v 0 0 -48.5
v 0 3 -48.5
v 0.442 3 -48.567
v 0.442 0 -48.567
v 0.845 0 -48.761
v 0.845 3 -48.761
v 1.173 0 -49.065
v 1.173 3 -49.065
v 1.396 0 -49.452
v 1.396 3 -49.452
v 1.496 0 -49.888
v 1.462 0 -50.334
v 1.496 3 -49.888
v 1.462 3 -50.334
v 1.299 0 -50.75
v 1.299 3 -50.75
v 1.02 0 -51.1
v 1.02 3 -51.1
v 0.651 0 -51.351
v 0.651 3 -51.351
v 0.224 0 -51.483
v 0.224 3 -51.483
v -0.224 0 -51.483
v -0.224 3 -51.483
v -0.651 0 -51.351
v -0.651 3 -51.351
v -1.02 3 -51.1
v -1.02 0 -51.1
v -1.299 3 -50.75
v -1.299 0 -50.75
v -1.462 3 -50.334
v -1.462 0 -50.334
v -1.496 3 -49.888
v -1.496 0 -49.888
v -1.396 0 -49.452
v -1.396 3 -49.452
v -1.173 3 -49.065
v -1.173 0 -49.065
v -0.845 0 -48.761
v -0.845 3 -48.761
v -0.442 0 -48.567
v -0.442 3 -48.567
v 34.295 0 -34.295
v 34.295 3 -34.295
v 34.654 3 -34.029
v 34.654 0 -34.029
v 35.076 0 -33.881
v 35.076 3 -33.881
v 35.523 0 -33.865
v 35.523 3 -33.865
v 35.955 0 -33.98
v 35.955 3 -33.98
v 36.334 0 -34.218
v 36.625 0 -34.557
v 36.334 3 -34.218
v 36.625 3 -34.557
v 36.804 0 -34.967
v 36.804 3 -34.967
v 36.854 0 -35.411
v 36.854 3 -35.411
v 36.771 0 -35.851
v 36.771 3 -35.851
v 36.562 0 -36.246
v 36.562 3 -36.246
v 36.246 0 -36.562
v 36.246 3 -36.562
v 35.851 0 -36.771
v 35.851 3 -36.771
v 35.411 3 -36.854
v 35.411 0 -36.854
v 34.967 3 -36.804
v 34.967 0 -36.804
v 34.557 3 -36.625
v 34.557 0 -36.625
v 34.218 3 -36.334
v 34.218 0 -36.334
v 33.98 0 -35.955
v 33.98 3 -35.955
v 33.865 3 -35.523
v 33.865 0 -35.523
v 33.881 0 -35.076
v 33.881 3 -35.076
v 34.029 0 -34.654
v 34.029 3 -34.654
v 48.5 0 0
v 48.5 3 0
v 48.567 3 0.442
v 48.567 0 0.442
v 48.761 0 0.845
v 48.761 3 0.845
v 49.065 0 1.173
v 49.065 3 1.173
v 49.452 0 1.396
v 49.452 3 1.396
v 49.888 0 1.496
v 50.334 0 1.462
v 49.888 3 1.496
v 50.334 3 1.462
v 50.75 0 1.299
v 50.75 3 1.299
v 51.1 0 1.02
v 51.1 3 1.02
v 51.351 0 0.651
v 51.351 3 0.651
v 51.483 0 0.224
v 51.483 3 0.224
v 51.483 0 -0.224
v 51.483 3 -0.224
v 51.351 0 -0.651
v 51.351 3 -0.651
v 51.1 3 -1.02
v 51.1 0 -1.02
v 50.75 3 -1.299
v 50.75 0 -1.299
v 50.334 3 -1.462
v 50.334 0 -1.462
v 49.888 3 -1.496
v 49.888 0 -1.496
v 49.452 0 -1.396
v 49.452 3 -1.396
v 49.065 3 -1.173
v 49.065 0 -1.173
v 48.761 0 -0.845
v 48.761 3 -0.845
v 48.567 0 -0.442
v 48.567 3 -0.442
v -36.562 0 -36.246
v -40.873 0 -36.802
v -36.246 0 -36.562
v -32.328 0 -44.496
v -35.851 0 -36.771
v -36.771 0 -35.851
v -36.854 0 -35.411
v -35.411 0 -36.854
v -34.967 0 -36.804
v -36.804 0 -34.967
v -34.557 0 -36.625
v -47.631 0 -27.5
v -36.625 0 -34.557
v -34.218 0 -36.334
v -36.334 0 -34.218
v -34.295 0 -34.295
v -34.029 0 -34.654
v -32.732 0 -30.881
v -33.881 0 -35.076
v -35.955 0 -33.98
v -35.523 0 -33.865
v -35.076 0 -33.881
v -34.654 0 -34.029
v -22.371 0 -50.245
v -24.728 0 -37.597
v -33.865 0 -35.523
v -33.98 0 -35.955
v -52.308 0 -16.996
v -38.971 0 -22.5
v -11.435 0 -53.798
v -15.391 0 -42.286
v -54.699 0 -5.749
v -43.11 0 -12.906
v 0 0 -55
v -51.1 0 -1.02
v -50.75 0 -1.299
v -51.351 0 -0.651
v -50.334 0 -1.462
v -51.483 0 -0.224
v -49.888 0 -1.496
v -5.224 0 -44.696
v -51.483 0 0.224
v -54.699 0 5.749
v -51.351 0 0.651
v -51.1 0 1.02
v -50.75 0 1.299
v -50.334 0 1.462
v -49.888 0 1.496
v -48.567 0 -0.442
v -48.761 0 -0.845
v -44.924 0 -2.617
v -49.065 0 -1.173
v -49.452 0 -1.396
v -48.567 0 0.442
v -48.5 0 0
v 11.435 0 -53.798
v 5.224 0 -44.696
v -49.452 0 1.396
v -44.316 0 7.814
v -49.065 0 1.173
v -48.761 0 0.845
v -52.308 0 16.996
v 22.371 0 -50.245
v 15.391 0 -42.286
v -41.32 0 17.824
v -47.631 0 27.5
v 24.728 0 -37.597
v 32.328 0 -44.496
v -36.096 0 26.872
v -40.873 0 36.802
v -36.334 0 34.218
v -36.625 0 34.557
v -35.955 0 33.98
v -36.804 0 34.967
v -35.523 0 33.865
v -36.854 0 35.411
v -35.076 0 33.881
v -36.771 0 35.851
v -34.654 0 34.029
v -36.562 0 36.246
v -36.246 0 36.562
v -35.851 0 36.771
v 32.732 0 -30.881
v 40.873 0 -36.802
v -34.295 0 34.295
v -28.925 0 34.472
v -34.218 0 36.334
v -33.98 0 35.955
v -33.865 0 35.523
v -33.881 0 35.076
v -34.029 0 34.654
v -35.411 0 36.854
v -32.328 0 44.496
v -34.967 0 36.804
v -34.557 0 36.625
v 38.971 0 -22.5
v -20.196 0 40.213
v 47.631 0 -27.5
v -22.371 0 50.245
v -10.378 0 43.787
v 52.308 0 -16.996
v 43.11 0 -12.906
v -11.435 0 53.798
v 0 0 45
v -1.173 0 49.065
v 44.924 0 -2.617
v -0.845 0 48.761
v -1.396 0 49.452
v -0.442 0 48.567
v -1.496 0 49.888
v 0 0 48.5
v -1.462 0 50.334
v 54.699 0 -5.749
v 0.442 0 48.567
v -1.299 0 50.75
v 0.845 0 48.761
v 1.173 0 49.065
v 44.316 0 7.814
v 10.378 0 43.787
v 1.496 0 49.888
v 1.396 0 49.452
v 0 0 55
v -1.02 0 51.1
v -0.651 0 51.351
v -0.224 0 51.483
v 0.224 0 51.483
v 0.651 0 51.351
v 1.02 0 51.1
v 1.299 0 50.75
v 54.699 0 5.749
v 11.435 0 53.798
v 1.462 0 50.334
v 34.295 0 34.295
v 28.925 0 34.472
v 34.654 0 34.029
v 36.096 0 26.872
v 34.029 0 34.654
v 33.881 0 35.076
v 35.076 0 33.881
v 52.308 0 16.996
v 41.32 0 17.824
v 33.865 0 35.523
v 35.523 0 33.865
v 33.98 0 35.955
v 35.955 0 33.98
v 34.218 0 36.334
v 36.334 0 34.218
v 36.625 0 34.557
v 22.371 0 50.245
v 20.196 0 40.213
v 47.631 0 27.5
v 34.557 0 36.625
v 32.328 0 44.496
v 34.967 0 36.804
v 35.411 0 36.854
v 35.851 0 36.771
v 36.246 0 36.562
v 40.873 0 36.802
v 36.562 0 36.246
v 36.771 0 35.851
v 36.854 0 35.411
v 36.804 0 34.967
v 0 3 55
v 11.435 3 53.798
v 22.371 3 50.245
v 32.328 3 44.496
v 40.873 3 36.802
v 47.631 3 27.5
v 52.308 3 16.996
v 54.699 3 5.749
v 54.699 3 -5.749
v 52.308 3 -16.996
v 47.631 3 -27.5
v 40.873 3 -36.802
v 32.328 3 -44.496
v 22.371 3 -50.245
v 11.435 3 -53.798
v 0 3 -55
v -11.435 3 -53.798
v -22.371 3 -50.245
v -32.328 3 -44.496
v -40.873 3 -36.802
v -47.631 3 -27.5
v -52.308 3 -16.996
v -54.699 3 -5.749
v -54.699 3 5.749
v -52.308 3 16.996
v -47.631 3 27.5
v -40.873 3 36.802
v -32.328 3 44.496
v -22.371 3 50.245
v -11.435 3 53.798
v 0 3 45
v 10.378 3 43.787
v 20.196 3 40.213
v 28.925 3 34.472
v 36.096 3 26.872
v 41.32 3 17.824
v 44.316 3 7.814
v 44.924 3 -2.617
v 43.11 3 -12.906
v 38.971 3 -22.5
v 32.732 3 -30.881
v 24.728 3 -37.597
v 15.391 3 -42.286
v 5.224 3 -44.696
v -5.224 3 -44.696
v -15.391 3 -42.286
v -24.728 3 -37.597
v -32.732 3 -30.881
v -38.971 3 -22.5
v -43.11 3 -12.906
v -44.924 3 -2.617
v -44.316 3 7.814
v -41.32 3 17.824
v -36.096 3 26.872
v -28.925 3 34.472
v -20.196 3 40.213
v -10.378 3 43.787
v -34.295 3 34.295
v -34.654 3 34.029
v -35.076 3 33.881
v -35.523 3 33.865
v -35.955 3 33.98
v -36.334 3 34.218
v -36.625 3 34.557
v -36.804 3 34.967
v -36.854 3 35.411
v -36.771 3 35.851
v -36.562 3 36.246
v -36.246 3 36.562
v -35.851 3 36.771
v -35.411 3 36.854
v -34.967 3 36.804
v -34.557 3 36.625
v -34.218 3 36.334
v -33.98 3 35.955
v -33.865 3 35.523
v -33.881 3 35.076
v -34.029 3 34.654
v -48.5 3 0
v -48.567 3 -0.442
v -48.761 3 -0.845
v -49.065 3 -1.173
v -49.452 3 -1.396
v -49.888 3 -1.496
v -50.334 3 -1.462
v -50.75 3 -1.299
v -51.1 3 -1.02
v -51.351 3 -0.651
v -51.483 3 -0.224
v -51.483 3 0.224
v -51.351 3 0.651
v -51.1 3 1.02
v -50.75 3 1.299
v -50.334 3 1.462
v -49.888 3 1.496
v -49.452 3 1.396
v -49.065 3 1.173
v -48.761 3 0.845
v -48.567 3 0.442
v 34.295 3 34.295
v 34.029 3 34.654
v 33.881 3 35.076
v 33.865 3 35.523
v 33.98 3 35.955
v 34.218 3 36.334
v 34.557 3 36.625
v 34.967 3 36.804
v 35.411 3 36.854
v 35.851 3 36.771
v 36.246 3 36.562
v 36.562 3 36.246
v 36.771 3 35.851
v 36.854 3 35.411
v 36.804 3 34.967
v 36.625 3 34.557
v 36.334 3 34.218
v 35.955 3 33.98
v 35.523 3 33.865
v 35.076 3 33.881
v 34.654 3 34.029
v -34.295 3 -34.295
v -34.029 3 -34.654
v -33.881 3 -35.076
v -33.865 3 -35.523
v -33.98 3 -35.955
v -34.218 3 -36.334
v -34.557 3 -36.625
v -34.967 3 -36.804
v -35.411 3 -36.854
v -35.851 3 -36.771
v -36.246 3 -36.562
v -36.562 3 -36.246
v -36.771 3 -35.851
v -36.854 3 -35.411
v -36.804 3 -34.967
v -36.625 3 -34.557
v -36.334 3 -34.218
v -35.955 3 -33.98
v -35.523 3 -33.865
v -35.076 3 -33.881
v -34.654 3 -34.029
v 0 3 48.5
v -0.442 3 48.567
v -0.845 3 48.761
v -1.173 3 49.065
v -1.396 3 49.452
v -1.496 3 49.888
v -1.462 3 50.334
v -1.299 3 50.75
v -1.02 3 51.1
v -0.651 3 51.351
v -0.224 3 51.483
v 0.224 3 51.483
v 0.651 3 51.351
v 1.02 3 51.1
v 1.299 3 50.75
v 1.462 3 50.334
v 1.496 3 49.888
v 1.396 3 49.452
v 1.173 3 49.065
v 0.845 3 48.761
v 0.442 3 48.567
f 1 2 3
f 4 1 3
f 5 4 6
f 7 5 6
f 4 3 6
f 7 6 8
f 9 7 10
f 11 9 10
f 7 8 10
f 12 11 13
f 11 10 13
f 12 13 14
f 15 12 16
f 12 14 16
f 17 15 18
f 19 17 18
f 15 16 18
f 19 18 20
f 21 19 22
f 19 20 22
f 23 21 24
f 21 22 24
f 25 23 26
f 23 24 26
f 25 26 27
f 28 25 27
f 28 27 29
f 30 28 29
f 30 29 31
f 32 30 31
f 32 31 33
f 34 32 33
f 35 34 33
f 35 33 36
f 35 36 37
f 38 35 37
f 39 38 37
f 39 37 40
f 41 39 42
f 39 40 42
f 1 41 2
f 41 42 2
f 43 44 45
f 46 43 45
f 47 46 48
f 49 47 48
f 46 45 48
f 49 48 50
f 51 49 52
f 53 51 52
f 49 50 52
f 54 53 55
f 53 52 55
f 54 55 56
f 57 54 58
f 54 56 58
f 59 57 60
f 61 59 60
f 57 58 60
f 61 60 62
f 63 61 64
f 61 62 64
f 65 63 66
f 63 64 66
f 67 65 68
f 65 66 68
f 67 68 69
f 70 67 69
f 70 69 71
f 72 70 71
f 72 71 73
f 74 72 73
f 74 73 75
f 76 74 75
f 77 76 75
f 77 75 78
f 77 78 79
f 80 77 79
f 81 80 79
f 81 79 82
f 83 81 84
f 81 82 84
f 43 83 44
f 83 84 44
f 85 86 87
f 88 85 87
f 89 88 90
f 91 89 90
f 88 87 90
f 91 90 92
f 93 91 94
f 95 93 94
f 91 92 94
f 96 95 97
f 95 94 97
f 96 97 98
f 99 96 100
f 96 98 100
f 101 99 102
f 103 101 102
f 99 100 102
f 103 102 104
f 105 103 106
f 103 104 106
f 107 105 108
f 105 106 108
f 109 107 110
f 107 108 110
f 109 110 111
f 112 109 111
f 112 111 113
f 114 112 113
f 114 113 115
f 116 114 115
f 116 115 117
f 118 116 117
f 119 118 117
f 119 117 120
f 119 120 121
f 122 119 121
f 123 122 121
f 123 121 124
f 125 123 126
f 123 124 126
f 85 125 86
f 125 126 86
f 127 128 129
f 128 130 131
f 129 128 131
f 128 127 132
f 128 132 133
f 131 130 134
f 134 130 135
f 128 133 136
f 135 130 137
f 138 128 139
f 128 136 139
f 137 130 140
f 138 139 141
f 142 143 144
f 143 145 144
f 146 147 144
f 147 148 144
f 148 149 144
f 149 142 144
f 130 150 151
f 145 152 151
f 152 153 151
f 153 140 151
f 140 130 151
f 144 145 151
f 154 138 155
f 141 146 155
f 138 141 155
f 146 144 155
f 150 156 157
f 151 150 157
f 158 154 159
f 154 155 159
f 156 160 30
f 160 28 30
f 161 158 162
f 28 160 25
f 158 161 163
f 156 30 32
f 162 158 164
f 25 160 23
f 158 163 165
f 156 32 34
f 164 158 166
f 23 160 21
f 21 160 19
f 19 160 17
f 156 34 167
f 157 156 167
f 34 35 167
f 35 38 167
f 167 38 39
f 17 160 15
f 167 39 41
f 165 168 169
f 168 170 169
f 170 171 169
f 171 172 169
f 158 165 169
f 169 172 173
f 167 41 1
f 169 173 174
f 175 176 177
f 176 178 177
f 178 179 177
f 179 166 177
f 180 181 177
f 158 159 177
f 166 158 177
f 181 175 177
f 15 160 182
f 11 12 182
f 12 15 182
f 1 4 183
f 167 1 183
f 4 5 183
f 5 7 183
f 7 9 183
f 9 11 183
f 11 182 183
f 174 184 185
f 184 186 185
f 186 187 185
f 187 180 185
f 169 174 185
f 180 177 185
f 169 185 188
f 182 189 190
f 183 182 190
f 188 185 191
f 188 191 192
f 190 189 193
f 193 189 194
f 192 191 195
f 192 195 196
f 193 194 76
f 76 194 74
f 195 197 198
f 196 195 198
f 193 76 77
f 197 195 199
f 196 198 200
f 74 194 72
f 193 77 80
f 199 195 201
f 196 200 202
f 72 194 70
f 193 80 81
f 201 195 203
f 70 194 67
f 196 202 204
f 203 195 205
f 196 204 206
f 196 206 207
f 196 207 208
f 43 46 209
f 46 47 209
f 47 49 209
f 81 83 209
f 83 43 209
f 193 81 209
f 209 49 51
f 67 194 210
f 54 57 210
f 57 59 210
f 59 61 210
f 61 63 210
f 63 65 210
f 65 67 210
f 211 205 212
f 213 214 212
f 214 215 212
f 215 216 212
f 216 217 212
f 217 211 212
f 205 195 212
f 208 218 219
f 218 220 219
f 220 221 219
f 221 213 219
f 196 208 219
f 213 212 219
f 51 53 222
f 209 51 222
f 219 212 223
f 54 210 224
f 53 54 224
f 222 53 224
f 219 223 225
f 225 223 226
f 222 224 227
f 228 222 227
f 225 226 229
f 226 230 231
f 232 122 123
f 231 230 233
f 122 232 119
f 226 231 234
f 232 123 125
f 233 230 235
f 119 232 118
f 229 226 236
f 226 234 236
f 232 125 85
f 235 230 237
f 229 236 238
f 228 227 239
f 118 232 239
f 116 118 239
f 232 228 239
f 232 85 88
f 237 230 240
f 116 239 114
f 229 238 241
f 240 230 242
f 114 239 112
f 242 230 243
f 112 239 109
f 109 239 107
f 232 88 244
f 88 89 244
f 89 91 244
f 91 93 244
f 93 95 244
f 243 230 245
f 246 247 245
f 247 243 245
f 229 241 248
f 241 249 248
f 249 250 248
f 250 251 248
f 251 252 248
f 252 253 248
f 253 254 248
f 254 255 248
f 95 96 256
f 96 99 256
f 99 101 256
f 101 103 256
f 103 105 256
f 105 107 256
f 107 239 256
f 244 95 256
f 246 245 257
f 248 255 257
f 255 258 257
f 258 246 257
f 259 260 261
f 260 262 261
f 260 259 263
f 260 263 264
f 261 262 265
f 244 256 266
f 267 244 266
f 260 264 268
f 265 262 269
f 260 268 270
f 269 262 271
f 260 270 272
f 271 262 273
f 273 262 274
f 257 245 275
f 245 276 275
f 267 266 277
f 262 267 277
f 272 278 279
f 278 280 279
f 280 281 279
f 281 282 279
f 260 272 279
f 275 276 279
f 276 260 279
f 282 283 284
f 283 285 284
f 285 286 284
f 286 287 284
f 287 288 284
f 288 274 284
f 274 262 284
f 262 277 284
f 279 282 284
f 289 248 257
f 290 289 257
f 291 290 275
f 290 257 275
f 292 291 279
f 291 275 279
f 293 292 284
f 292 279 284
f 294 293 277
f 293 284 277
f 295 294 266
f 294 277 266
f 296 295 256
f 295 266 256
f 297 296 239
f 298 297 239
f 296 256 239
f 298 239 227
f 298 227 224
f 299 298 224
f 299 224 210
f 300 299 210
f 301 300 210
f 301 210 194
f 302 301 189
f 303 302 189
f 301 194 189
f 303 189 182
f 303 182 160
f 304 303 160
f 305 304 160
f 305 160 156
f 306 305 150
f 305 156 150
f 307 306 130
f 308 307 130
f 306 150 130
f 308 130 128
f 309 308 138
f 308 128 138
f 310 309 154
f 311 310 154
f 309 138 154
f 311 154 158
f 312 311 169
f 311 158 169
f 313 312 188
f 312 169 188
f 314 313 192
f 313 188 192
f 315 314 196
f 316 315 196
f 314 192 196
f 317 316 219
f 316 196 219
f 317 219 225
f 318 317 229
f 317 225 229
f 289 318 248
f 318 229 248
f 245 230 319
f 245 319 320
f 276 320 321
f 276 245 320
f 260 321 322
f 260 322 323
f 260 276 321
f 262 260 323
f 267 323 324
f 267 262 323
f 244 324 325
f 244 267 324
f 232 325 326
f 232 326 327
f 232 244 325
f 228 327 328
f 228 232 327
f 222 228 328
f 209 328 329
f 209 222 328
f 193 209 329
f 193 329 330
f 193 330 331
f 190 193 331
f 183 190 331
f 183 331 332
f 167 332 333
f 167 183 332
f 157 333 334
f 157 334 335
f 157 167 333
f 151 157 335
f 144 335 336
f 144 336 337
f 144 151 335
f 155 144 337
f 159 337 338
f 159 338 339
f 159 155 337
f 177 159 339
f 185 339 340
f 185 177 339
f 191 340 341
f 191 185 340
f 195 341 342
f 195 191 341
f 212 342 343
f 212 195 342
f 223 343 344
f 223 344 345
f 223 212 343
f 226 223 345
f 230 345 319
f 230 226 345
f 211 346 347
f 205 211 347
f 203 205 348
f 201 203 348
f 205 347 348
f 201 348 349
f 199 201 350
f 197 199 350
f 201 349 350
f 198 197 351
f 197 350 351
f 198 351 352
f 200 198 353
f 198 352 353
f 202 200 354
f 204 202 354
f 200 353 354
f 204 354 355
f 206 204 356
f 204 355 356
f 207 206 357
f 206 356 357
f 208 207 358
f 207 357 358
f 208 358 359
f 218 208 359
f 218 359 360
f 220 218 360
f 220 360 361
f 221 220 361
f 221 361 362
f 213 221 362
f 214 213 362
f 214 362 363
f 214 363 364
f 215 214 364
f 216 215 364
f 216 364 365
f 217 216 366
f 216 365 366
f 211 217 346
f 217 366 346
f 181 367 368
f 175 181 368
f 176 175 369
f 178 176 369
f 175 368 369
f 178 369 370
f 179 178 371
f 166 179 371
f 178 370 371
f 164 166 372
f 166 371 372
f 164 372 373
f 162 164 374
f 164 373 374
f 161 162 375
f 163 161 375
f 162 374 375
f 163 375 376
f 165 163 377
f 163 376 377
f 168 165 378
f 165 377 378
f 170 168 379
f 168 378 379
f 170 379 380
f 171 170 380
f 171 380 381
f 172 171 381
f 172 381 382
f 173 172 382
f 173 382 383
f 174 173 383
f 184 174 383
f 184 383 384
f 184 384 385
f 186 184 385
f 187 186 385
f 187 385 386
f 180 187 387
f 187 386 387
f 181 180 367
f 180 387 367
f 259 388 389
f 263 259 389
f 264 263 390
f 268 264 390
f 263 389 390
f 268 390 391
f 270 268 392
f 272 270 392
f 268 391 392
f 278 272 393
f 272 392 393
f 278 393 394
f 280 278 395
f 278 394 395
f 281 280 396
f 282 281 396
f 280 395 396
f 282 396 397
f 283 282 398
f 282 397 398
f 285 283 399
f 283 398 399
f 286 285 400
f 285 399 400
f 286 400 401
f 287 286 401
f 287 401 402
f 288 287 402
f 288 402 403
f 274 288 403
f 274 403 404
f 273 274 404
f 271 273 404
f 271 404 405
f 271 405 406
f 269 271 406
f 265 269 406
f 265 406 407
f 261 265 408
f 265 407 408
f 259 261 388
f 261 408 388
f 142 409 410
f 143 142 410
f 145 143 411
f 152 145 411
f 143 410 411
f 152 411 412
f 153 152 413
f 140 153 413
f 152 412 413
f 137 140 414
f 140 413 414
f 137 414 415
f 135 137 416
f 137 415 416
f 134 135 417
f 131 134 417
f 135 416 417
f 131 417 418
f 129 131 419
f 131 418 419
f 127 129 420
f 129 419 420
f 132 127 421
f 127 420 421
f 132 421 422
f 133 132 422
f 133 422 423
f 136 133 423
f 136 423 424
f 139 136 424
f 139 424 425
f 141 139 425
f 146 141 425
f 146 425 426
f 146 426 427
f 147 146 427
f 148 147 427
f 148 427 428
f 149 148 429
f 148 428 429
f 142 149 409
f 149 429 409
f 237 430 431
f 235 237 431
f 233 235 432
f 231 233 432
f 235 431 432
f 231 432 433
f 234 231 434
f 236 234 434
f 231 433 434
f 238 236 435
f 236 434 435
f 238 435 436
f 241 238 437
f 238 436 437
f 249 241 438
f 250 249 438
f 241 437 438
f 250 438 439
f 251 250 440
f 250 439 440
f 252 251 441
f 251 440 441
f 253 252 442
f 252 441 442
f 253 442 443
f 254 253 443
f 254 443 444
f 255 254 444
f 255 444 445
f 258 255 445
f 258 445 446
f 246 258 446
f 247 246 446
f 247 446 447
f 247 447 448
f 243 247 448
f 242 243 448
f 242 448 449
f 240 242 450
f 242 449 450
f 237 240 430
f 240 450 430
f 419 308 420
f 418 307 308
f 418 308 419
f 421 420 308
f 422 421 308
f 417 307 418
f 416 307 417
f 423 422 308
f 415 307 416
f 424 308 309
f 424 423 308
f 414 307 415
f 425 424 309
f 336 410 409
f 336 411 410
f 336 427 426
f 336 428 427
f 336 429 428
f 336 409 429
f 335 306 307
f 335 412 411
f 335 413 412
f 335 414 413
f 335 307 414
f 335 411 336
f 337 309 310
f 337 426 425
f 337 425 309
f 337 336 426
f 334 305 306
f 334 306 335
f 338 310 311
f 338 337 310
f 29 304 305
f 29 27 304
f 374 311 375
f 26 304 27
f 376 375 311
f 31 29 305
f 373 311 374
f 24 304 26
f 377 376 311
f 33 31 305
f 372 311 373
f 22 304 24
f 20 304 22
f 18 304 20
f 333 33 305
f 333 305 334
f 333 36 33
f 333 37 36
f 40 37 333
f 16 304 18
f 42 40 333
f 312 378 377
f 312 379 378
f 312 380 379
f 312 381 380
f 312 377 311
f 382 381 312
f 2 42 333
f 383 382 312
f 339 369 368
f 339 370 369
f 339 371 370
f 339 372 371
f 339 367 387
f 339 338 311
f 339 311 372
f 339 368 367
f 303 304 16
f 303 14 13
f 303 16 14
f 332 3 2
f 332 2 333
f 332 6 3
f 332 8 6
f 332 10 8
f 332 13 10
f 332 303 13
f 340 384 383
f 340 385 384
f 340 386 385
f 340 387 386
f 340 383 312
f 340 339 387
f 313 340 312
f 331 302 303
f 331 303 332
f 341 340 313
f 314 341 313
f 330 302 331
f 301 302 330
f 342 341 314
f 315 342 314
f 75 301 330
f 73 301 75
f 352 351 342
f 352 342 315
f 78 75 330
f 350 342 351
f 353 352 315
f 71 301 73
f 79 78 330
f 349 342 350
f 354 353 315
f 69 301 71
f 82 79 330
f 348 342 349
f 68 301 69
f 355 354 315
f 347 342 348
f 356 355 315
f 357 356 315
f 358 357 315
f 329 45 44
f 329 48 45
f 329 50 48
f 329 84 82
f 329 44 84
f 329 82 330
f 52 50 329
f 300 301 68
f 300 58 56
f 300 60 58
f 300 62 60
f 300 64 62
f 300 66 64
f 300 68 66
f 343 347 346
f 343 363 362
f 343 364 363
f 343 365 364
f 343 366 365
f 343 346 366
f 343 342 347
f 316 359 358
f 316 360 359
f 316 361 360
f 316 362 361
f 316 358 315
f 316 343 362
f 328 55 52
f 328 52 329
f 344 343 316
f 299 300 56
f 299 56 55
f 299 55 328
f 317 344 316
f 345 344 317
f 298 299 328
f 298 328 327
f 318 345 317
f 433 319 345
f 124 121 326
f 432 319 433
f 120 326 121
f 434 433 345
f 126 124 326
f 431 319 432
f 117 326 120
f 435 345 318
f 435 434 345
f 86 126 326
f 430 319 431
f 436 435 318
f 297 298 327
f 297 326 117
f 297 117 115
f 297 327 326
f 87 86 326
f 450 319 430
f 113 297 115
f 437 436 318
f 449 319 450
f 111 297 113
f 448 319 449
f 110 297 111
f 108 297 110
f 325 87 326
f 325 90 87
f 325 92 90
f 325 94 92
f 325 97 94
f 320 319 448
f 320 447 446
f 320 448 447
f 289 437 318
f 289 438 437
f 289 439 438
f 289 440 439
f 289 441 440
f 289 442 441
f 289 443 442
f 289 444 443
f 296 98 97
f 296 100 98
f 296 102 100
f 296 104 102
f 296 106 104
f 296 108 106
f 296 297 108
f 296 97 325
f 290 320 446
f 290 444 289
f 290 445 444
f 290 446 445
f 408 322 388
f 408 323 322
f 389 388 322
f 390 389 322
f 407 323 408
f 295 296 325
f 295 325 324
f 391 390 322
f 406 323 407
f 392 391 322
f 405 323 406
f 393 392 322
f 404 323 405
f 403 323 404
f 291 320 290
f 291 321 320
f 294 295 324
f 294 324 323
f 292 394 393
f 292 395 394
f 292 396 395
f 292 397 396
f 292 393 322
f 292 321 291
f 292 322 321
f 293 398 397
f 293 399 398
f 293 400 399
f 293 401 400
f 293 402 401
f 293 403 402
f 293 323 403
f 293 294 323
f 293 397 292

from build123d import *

# Parameters (mm, degrees)
SKETCH1_R           = 55
SKETCH1_R_2         = 45
BOSS_EXTRUDE1_DEPTH = 3
SKETCH3_R           = 1.5
CUT_EXTRUDE1_DEPTH  = 3
CRVPATTERN1_COUNT   = 8


with BuildPart() as part:
    # Sketch1 → Boss-Extrude1 (new body)
    with BuildSketch(Plane(origin=(0, 0, 0), x_dir=(1, 0, 0), z_dir=(0, 1, 0))):
        with Locations(Location((0, 0, 0), (0, 0, 270))):
            Circle(SKETCH1_R)
        with Locations(Location((0, 0, 0), (0, 0, 270))):
            Circle(SKETCH1_R_2, mode=Mode.SUBTRACT)
    extrude(amount=BOSS_EXTRUDE1_DEPTH)

    # Sketch3 → Cut-Extrude1 (cut)
    with BuildSketch(Plane(origin=(0, 3, 0), x_dir=(1, 0, 0), z_dir=(0, 1, 0))):
        with Locations(Location((0, 50, 0), (0, 0, 270))):
            Circle(SKETCH3_R)
    cut_extrude1 = extrude(amount=-CUT_EXTRUDE1_DEPTH, mode=Mode.SUBTRACT)

    # CrvPattern1: Cut-Extrude1 ×8 about axis
    crvpattern1_axis = Axis((0, 3, 0), (0, 1, 0))
    for i in range(1, CRVPATTERN1_COUNT):
        add(cut_extrude1.rotate(crvpattern1_axis, i * 360 / CRVPATTERN1_COUNT), mode=Mode.SUBTRACT)


solid = part.part
